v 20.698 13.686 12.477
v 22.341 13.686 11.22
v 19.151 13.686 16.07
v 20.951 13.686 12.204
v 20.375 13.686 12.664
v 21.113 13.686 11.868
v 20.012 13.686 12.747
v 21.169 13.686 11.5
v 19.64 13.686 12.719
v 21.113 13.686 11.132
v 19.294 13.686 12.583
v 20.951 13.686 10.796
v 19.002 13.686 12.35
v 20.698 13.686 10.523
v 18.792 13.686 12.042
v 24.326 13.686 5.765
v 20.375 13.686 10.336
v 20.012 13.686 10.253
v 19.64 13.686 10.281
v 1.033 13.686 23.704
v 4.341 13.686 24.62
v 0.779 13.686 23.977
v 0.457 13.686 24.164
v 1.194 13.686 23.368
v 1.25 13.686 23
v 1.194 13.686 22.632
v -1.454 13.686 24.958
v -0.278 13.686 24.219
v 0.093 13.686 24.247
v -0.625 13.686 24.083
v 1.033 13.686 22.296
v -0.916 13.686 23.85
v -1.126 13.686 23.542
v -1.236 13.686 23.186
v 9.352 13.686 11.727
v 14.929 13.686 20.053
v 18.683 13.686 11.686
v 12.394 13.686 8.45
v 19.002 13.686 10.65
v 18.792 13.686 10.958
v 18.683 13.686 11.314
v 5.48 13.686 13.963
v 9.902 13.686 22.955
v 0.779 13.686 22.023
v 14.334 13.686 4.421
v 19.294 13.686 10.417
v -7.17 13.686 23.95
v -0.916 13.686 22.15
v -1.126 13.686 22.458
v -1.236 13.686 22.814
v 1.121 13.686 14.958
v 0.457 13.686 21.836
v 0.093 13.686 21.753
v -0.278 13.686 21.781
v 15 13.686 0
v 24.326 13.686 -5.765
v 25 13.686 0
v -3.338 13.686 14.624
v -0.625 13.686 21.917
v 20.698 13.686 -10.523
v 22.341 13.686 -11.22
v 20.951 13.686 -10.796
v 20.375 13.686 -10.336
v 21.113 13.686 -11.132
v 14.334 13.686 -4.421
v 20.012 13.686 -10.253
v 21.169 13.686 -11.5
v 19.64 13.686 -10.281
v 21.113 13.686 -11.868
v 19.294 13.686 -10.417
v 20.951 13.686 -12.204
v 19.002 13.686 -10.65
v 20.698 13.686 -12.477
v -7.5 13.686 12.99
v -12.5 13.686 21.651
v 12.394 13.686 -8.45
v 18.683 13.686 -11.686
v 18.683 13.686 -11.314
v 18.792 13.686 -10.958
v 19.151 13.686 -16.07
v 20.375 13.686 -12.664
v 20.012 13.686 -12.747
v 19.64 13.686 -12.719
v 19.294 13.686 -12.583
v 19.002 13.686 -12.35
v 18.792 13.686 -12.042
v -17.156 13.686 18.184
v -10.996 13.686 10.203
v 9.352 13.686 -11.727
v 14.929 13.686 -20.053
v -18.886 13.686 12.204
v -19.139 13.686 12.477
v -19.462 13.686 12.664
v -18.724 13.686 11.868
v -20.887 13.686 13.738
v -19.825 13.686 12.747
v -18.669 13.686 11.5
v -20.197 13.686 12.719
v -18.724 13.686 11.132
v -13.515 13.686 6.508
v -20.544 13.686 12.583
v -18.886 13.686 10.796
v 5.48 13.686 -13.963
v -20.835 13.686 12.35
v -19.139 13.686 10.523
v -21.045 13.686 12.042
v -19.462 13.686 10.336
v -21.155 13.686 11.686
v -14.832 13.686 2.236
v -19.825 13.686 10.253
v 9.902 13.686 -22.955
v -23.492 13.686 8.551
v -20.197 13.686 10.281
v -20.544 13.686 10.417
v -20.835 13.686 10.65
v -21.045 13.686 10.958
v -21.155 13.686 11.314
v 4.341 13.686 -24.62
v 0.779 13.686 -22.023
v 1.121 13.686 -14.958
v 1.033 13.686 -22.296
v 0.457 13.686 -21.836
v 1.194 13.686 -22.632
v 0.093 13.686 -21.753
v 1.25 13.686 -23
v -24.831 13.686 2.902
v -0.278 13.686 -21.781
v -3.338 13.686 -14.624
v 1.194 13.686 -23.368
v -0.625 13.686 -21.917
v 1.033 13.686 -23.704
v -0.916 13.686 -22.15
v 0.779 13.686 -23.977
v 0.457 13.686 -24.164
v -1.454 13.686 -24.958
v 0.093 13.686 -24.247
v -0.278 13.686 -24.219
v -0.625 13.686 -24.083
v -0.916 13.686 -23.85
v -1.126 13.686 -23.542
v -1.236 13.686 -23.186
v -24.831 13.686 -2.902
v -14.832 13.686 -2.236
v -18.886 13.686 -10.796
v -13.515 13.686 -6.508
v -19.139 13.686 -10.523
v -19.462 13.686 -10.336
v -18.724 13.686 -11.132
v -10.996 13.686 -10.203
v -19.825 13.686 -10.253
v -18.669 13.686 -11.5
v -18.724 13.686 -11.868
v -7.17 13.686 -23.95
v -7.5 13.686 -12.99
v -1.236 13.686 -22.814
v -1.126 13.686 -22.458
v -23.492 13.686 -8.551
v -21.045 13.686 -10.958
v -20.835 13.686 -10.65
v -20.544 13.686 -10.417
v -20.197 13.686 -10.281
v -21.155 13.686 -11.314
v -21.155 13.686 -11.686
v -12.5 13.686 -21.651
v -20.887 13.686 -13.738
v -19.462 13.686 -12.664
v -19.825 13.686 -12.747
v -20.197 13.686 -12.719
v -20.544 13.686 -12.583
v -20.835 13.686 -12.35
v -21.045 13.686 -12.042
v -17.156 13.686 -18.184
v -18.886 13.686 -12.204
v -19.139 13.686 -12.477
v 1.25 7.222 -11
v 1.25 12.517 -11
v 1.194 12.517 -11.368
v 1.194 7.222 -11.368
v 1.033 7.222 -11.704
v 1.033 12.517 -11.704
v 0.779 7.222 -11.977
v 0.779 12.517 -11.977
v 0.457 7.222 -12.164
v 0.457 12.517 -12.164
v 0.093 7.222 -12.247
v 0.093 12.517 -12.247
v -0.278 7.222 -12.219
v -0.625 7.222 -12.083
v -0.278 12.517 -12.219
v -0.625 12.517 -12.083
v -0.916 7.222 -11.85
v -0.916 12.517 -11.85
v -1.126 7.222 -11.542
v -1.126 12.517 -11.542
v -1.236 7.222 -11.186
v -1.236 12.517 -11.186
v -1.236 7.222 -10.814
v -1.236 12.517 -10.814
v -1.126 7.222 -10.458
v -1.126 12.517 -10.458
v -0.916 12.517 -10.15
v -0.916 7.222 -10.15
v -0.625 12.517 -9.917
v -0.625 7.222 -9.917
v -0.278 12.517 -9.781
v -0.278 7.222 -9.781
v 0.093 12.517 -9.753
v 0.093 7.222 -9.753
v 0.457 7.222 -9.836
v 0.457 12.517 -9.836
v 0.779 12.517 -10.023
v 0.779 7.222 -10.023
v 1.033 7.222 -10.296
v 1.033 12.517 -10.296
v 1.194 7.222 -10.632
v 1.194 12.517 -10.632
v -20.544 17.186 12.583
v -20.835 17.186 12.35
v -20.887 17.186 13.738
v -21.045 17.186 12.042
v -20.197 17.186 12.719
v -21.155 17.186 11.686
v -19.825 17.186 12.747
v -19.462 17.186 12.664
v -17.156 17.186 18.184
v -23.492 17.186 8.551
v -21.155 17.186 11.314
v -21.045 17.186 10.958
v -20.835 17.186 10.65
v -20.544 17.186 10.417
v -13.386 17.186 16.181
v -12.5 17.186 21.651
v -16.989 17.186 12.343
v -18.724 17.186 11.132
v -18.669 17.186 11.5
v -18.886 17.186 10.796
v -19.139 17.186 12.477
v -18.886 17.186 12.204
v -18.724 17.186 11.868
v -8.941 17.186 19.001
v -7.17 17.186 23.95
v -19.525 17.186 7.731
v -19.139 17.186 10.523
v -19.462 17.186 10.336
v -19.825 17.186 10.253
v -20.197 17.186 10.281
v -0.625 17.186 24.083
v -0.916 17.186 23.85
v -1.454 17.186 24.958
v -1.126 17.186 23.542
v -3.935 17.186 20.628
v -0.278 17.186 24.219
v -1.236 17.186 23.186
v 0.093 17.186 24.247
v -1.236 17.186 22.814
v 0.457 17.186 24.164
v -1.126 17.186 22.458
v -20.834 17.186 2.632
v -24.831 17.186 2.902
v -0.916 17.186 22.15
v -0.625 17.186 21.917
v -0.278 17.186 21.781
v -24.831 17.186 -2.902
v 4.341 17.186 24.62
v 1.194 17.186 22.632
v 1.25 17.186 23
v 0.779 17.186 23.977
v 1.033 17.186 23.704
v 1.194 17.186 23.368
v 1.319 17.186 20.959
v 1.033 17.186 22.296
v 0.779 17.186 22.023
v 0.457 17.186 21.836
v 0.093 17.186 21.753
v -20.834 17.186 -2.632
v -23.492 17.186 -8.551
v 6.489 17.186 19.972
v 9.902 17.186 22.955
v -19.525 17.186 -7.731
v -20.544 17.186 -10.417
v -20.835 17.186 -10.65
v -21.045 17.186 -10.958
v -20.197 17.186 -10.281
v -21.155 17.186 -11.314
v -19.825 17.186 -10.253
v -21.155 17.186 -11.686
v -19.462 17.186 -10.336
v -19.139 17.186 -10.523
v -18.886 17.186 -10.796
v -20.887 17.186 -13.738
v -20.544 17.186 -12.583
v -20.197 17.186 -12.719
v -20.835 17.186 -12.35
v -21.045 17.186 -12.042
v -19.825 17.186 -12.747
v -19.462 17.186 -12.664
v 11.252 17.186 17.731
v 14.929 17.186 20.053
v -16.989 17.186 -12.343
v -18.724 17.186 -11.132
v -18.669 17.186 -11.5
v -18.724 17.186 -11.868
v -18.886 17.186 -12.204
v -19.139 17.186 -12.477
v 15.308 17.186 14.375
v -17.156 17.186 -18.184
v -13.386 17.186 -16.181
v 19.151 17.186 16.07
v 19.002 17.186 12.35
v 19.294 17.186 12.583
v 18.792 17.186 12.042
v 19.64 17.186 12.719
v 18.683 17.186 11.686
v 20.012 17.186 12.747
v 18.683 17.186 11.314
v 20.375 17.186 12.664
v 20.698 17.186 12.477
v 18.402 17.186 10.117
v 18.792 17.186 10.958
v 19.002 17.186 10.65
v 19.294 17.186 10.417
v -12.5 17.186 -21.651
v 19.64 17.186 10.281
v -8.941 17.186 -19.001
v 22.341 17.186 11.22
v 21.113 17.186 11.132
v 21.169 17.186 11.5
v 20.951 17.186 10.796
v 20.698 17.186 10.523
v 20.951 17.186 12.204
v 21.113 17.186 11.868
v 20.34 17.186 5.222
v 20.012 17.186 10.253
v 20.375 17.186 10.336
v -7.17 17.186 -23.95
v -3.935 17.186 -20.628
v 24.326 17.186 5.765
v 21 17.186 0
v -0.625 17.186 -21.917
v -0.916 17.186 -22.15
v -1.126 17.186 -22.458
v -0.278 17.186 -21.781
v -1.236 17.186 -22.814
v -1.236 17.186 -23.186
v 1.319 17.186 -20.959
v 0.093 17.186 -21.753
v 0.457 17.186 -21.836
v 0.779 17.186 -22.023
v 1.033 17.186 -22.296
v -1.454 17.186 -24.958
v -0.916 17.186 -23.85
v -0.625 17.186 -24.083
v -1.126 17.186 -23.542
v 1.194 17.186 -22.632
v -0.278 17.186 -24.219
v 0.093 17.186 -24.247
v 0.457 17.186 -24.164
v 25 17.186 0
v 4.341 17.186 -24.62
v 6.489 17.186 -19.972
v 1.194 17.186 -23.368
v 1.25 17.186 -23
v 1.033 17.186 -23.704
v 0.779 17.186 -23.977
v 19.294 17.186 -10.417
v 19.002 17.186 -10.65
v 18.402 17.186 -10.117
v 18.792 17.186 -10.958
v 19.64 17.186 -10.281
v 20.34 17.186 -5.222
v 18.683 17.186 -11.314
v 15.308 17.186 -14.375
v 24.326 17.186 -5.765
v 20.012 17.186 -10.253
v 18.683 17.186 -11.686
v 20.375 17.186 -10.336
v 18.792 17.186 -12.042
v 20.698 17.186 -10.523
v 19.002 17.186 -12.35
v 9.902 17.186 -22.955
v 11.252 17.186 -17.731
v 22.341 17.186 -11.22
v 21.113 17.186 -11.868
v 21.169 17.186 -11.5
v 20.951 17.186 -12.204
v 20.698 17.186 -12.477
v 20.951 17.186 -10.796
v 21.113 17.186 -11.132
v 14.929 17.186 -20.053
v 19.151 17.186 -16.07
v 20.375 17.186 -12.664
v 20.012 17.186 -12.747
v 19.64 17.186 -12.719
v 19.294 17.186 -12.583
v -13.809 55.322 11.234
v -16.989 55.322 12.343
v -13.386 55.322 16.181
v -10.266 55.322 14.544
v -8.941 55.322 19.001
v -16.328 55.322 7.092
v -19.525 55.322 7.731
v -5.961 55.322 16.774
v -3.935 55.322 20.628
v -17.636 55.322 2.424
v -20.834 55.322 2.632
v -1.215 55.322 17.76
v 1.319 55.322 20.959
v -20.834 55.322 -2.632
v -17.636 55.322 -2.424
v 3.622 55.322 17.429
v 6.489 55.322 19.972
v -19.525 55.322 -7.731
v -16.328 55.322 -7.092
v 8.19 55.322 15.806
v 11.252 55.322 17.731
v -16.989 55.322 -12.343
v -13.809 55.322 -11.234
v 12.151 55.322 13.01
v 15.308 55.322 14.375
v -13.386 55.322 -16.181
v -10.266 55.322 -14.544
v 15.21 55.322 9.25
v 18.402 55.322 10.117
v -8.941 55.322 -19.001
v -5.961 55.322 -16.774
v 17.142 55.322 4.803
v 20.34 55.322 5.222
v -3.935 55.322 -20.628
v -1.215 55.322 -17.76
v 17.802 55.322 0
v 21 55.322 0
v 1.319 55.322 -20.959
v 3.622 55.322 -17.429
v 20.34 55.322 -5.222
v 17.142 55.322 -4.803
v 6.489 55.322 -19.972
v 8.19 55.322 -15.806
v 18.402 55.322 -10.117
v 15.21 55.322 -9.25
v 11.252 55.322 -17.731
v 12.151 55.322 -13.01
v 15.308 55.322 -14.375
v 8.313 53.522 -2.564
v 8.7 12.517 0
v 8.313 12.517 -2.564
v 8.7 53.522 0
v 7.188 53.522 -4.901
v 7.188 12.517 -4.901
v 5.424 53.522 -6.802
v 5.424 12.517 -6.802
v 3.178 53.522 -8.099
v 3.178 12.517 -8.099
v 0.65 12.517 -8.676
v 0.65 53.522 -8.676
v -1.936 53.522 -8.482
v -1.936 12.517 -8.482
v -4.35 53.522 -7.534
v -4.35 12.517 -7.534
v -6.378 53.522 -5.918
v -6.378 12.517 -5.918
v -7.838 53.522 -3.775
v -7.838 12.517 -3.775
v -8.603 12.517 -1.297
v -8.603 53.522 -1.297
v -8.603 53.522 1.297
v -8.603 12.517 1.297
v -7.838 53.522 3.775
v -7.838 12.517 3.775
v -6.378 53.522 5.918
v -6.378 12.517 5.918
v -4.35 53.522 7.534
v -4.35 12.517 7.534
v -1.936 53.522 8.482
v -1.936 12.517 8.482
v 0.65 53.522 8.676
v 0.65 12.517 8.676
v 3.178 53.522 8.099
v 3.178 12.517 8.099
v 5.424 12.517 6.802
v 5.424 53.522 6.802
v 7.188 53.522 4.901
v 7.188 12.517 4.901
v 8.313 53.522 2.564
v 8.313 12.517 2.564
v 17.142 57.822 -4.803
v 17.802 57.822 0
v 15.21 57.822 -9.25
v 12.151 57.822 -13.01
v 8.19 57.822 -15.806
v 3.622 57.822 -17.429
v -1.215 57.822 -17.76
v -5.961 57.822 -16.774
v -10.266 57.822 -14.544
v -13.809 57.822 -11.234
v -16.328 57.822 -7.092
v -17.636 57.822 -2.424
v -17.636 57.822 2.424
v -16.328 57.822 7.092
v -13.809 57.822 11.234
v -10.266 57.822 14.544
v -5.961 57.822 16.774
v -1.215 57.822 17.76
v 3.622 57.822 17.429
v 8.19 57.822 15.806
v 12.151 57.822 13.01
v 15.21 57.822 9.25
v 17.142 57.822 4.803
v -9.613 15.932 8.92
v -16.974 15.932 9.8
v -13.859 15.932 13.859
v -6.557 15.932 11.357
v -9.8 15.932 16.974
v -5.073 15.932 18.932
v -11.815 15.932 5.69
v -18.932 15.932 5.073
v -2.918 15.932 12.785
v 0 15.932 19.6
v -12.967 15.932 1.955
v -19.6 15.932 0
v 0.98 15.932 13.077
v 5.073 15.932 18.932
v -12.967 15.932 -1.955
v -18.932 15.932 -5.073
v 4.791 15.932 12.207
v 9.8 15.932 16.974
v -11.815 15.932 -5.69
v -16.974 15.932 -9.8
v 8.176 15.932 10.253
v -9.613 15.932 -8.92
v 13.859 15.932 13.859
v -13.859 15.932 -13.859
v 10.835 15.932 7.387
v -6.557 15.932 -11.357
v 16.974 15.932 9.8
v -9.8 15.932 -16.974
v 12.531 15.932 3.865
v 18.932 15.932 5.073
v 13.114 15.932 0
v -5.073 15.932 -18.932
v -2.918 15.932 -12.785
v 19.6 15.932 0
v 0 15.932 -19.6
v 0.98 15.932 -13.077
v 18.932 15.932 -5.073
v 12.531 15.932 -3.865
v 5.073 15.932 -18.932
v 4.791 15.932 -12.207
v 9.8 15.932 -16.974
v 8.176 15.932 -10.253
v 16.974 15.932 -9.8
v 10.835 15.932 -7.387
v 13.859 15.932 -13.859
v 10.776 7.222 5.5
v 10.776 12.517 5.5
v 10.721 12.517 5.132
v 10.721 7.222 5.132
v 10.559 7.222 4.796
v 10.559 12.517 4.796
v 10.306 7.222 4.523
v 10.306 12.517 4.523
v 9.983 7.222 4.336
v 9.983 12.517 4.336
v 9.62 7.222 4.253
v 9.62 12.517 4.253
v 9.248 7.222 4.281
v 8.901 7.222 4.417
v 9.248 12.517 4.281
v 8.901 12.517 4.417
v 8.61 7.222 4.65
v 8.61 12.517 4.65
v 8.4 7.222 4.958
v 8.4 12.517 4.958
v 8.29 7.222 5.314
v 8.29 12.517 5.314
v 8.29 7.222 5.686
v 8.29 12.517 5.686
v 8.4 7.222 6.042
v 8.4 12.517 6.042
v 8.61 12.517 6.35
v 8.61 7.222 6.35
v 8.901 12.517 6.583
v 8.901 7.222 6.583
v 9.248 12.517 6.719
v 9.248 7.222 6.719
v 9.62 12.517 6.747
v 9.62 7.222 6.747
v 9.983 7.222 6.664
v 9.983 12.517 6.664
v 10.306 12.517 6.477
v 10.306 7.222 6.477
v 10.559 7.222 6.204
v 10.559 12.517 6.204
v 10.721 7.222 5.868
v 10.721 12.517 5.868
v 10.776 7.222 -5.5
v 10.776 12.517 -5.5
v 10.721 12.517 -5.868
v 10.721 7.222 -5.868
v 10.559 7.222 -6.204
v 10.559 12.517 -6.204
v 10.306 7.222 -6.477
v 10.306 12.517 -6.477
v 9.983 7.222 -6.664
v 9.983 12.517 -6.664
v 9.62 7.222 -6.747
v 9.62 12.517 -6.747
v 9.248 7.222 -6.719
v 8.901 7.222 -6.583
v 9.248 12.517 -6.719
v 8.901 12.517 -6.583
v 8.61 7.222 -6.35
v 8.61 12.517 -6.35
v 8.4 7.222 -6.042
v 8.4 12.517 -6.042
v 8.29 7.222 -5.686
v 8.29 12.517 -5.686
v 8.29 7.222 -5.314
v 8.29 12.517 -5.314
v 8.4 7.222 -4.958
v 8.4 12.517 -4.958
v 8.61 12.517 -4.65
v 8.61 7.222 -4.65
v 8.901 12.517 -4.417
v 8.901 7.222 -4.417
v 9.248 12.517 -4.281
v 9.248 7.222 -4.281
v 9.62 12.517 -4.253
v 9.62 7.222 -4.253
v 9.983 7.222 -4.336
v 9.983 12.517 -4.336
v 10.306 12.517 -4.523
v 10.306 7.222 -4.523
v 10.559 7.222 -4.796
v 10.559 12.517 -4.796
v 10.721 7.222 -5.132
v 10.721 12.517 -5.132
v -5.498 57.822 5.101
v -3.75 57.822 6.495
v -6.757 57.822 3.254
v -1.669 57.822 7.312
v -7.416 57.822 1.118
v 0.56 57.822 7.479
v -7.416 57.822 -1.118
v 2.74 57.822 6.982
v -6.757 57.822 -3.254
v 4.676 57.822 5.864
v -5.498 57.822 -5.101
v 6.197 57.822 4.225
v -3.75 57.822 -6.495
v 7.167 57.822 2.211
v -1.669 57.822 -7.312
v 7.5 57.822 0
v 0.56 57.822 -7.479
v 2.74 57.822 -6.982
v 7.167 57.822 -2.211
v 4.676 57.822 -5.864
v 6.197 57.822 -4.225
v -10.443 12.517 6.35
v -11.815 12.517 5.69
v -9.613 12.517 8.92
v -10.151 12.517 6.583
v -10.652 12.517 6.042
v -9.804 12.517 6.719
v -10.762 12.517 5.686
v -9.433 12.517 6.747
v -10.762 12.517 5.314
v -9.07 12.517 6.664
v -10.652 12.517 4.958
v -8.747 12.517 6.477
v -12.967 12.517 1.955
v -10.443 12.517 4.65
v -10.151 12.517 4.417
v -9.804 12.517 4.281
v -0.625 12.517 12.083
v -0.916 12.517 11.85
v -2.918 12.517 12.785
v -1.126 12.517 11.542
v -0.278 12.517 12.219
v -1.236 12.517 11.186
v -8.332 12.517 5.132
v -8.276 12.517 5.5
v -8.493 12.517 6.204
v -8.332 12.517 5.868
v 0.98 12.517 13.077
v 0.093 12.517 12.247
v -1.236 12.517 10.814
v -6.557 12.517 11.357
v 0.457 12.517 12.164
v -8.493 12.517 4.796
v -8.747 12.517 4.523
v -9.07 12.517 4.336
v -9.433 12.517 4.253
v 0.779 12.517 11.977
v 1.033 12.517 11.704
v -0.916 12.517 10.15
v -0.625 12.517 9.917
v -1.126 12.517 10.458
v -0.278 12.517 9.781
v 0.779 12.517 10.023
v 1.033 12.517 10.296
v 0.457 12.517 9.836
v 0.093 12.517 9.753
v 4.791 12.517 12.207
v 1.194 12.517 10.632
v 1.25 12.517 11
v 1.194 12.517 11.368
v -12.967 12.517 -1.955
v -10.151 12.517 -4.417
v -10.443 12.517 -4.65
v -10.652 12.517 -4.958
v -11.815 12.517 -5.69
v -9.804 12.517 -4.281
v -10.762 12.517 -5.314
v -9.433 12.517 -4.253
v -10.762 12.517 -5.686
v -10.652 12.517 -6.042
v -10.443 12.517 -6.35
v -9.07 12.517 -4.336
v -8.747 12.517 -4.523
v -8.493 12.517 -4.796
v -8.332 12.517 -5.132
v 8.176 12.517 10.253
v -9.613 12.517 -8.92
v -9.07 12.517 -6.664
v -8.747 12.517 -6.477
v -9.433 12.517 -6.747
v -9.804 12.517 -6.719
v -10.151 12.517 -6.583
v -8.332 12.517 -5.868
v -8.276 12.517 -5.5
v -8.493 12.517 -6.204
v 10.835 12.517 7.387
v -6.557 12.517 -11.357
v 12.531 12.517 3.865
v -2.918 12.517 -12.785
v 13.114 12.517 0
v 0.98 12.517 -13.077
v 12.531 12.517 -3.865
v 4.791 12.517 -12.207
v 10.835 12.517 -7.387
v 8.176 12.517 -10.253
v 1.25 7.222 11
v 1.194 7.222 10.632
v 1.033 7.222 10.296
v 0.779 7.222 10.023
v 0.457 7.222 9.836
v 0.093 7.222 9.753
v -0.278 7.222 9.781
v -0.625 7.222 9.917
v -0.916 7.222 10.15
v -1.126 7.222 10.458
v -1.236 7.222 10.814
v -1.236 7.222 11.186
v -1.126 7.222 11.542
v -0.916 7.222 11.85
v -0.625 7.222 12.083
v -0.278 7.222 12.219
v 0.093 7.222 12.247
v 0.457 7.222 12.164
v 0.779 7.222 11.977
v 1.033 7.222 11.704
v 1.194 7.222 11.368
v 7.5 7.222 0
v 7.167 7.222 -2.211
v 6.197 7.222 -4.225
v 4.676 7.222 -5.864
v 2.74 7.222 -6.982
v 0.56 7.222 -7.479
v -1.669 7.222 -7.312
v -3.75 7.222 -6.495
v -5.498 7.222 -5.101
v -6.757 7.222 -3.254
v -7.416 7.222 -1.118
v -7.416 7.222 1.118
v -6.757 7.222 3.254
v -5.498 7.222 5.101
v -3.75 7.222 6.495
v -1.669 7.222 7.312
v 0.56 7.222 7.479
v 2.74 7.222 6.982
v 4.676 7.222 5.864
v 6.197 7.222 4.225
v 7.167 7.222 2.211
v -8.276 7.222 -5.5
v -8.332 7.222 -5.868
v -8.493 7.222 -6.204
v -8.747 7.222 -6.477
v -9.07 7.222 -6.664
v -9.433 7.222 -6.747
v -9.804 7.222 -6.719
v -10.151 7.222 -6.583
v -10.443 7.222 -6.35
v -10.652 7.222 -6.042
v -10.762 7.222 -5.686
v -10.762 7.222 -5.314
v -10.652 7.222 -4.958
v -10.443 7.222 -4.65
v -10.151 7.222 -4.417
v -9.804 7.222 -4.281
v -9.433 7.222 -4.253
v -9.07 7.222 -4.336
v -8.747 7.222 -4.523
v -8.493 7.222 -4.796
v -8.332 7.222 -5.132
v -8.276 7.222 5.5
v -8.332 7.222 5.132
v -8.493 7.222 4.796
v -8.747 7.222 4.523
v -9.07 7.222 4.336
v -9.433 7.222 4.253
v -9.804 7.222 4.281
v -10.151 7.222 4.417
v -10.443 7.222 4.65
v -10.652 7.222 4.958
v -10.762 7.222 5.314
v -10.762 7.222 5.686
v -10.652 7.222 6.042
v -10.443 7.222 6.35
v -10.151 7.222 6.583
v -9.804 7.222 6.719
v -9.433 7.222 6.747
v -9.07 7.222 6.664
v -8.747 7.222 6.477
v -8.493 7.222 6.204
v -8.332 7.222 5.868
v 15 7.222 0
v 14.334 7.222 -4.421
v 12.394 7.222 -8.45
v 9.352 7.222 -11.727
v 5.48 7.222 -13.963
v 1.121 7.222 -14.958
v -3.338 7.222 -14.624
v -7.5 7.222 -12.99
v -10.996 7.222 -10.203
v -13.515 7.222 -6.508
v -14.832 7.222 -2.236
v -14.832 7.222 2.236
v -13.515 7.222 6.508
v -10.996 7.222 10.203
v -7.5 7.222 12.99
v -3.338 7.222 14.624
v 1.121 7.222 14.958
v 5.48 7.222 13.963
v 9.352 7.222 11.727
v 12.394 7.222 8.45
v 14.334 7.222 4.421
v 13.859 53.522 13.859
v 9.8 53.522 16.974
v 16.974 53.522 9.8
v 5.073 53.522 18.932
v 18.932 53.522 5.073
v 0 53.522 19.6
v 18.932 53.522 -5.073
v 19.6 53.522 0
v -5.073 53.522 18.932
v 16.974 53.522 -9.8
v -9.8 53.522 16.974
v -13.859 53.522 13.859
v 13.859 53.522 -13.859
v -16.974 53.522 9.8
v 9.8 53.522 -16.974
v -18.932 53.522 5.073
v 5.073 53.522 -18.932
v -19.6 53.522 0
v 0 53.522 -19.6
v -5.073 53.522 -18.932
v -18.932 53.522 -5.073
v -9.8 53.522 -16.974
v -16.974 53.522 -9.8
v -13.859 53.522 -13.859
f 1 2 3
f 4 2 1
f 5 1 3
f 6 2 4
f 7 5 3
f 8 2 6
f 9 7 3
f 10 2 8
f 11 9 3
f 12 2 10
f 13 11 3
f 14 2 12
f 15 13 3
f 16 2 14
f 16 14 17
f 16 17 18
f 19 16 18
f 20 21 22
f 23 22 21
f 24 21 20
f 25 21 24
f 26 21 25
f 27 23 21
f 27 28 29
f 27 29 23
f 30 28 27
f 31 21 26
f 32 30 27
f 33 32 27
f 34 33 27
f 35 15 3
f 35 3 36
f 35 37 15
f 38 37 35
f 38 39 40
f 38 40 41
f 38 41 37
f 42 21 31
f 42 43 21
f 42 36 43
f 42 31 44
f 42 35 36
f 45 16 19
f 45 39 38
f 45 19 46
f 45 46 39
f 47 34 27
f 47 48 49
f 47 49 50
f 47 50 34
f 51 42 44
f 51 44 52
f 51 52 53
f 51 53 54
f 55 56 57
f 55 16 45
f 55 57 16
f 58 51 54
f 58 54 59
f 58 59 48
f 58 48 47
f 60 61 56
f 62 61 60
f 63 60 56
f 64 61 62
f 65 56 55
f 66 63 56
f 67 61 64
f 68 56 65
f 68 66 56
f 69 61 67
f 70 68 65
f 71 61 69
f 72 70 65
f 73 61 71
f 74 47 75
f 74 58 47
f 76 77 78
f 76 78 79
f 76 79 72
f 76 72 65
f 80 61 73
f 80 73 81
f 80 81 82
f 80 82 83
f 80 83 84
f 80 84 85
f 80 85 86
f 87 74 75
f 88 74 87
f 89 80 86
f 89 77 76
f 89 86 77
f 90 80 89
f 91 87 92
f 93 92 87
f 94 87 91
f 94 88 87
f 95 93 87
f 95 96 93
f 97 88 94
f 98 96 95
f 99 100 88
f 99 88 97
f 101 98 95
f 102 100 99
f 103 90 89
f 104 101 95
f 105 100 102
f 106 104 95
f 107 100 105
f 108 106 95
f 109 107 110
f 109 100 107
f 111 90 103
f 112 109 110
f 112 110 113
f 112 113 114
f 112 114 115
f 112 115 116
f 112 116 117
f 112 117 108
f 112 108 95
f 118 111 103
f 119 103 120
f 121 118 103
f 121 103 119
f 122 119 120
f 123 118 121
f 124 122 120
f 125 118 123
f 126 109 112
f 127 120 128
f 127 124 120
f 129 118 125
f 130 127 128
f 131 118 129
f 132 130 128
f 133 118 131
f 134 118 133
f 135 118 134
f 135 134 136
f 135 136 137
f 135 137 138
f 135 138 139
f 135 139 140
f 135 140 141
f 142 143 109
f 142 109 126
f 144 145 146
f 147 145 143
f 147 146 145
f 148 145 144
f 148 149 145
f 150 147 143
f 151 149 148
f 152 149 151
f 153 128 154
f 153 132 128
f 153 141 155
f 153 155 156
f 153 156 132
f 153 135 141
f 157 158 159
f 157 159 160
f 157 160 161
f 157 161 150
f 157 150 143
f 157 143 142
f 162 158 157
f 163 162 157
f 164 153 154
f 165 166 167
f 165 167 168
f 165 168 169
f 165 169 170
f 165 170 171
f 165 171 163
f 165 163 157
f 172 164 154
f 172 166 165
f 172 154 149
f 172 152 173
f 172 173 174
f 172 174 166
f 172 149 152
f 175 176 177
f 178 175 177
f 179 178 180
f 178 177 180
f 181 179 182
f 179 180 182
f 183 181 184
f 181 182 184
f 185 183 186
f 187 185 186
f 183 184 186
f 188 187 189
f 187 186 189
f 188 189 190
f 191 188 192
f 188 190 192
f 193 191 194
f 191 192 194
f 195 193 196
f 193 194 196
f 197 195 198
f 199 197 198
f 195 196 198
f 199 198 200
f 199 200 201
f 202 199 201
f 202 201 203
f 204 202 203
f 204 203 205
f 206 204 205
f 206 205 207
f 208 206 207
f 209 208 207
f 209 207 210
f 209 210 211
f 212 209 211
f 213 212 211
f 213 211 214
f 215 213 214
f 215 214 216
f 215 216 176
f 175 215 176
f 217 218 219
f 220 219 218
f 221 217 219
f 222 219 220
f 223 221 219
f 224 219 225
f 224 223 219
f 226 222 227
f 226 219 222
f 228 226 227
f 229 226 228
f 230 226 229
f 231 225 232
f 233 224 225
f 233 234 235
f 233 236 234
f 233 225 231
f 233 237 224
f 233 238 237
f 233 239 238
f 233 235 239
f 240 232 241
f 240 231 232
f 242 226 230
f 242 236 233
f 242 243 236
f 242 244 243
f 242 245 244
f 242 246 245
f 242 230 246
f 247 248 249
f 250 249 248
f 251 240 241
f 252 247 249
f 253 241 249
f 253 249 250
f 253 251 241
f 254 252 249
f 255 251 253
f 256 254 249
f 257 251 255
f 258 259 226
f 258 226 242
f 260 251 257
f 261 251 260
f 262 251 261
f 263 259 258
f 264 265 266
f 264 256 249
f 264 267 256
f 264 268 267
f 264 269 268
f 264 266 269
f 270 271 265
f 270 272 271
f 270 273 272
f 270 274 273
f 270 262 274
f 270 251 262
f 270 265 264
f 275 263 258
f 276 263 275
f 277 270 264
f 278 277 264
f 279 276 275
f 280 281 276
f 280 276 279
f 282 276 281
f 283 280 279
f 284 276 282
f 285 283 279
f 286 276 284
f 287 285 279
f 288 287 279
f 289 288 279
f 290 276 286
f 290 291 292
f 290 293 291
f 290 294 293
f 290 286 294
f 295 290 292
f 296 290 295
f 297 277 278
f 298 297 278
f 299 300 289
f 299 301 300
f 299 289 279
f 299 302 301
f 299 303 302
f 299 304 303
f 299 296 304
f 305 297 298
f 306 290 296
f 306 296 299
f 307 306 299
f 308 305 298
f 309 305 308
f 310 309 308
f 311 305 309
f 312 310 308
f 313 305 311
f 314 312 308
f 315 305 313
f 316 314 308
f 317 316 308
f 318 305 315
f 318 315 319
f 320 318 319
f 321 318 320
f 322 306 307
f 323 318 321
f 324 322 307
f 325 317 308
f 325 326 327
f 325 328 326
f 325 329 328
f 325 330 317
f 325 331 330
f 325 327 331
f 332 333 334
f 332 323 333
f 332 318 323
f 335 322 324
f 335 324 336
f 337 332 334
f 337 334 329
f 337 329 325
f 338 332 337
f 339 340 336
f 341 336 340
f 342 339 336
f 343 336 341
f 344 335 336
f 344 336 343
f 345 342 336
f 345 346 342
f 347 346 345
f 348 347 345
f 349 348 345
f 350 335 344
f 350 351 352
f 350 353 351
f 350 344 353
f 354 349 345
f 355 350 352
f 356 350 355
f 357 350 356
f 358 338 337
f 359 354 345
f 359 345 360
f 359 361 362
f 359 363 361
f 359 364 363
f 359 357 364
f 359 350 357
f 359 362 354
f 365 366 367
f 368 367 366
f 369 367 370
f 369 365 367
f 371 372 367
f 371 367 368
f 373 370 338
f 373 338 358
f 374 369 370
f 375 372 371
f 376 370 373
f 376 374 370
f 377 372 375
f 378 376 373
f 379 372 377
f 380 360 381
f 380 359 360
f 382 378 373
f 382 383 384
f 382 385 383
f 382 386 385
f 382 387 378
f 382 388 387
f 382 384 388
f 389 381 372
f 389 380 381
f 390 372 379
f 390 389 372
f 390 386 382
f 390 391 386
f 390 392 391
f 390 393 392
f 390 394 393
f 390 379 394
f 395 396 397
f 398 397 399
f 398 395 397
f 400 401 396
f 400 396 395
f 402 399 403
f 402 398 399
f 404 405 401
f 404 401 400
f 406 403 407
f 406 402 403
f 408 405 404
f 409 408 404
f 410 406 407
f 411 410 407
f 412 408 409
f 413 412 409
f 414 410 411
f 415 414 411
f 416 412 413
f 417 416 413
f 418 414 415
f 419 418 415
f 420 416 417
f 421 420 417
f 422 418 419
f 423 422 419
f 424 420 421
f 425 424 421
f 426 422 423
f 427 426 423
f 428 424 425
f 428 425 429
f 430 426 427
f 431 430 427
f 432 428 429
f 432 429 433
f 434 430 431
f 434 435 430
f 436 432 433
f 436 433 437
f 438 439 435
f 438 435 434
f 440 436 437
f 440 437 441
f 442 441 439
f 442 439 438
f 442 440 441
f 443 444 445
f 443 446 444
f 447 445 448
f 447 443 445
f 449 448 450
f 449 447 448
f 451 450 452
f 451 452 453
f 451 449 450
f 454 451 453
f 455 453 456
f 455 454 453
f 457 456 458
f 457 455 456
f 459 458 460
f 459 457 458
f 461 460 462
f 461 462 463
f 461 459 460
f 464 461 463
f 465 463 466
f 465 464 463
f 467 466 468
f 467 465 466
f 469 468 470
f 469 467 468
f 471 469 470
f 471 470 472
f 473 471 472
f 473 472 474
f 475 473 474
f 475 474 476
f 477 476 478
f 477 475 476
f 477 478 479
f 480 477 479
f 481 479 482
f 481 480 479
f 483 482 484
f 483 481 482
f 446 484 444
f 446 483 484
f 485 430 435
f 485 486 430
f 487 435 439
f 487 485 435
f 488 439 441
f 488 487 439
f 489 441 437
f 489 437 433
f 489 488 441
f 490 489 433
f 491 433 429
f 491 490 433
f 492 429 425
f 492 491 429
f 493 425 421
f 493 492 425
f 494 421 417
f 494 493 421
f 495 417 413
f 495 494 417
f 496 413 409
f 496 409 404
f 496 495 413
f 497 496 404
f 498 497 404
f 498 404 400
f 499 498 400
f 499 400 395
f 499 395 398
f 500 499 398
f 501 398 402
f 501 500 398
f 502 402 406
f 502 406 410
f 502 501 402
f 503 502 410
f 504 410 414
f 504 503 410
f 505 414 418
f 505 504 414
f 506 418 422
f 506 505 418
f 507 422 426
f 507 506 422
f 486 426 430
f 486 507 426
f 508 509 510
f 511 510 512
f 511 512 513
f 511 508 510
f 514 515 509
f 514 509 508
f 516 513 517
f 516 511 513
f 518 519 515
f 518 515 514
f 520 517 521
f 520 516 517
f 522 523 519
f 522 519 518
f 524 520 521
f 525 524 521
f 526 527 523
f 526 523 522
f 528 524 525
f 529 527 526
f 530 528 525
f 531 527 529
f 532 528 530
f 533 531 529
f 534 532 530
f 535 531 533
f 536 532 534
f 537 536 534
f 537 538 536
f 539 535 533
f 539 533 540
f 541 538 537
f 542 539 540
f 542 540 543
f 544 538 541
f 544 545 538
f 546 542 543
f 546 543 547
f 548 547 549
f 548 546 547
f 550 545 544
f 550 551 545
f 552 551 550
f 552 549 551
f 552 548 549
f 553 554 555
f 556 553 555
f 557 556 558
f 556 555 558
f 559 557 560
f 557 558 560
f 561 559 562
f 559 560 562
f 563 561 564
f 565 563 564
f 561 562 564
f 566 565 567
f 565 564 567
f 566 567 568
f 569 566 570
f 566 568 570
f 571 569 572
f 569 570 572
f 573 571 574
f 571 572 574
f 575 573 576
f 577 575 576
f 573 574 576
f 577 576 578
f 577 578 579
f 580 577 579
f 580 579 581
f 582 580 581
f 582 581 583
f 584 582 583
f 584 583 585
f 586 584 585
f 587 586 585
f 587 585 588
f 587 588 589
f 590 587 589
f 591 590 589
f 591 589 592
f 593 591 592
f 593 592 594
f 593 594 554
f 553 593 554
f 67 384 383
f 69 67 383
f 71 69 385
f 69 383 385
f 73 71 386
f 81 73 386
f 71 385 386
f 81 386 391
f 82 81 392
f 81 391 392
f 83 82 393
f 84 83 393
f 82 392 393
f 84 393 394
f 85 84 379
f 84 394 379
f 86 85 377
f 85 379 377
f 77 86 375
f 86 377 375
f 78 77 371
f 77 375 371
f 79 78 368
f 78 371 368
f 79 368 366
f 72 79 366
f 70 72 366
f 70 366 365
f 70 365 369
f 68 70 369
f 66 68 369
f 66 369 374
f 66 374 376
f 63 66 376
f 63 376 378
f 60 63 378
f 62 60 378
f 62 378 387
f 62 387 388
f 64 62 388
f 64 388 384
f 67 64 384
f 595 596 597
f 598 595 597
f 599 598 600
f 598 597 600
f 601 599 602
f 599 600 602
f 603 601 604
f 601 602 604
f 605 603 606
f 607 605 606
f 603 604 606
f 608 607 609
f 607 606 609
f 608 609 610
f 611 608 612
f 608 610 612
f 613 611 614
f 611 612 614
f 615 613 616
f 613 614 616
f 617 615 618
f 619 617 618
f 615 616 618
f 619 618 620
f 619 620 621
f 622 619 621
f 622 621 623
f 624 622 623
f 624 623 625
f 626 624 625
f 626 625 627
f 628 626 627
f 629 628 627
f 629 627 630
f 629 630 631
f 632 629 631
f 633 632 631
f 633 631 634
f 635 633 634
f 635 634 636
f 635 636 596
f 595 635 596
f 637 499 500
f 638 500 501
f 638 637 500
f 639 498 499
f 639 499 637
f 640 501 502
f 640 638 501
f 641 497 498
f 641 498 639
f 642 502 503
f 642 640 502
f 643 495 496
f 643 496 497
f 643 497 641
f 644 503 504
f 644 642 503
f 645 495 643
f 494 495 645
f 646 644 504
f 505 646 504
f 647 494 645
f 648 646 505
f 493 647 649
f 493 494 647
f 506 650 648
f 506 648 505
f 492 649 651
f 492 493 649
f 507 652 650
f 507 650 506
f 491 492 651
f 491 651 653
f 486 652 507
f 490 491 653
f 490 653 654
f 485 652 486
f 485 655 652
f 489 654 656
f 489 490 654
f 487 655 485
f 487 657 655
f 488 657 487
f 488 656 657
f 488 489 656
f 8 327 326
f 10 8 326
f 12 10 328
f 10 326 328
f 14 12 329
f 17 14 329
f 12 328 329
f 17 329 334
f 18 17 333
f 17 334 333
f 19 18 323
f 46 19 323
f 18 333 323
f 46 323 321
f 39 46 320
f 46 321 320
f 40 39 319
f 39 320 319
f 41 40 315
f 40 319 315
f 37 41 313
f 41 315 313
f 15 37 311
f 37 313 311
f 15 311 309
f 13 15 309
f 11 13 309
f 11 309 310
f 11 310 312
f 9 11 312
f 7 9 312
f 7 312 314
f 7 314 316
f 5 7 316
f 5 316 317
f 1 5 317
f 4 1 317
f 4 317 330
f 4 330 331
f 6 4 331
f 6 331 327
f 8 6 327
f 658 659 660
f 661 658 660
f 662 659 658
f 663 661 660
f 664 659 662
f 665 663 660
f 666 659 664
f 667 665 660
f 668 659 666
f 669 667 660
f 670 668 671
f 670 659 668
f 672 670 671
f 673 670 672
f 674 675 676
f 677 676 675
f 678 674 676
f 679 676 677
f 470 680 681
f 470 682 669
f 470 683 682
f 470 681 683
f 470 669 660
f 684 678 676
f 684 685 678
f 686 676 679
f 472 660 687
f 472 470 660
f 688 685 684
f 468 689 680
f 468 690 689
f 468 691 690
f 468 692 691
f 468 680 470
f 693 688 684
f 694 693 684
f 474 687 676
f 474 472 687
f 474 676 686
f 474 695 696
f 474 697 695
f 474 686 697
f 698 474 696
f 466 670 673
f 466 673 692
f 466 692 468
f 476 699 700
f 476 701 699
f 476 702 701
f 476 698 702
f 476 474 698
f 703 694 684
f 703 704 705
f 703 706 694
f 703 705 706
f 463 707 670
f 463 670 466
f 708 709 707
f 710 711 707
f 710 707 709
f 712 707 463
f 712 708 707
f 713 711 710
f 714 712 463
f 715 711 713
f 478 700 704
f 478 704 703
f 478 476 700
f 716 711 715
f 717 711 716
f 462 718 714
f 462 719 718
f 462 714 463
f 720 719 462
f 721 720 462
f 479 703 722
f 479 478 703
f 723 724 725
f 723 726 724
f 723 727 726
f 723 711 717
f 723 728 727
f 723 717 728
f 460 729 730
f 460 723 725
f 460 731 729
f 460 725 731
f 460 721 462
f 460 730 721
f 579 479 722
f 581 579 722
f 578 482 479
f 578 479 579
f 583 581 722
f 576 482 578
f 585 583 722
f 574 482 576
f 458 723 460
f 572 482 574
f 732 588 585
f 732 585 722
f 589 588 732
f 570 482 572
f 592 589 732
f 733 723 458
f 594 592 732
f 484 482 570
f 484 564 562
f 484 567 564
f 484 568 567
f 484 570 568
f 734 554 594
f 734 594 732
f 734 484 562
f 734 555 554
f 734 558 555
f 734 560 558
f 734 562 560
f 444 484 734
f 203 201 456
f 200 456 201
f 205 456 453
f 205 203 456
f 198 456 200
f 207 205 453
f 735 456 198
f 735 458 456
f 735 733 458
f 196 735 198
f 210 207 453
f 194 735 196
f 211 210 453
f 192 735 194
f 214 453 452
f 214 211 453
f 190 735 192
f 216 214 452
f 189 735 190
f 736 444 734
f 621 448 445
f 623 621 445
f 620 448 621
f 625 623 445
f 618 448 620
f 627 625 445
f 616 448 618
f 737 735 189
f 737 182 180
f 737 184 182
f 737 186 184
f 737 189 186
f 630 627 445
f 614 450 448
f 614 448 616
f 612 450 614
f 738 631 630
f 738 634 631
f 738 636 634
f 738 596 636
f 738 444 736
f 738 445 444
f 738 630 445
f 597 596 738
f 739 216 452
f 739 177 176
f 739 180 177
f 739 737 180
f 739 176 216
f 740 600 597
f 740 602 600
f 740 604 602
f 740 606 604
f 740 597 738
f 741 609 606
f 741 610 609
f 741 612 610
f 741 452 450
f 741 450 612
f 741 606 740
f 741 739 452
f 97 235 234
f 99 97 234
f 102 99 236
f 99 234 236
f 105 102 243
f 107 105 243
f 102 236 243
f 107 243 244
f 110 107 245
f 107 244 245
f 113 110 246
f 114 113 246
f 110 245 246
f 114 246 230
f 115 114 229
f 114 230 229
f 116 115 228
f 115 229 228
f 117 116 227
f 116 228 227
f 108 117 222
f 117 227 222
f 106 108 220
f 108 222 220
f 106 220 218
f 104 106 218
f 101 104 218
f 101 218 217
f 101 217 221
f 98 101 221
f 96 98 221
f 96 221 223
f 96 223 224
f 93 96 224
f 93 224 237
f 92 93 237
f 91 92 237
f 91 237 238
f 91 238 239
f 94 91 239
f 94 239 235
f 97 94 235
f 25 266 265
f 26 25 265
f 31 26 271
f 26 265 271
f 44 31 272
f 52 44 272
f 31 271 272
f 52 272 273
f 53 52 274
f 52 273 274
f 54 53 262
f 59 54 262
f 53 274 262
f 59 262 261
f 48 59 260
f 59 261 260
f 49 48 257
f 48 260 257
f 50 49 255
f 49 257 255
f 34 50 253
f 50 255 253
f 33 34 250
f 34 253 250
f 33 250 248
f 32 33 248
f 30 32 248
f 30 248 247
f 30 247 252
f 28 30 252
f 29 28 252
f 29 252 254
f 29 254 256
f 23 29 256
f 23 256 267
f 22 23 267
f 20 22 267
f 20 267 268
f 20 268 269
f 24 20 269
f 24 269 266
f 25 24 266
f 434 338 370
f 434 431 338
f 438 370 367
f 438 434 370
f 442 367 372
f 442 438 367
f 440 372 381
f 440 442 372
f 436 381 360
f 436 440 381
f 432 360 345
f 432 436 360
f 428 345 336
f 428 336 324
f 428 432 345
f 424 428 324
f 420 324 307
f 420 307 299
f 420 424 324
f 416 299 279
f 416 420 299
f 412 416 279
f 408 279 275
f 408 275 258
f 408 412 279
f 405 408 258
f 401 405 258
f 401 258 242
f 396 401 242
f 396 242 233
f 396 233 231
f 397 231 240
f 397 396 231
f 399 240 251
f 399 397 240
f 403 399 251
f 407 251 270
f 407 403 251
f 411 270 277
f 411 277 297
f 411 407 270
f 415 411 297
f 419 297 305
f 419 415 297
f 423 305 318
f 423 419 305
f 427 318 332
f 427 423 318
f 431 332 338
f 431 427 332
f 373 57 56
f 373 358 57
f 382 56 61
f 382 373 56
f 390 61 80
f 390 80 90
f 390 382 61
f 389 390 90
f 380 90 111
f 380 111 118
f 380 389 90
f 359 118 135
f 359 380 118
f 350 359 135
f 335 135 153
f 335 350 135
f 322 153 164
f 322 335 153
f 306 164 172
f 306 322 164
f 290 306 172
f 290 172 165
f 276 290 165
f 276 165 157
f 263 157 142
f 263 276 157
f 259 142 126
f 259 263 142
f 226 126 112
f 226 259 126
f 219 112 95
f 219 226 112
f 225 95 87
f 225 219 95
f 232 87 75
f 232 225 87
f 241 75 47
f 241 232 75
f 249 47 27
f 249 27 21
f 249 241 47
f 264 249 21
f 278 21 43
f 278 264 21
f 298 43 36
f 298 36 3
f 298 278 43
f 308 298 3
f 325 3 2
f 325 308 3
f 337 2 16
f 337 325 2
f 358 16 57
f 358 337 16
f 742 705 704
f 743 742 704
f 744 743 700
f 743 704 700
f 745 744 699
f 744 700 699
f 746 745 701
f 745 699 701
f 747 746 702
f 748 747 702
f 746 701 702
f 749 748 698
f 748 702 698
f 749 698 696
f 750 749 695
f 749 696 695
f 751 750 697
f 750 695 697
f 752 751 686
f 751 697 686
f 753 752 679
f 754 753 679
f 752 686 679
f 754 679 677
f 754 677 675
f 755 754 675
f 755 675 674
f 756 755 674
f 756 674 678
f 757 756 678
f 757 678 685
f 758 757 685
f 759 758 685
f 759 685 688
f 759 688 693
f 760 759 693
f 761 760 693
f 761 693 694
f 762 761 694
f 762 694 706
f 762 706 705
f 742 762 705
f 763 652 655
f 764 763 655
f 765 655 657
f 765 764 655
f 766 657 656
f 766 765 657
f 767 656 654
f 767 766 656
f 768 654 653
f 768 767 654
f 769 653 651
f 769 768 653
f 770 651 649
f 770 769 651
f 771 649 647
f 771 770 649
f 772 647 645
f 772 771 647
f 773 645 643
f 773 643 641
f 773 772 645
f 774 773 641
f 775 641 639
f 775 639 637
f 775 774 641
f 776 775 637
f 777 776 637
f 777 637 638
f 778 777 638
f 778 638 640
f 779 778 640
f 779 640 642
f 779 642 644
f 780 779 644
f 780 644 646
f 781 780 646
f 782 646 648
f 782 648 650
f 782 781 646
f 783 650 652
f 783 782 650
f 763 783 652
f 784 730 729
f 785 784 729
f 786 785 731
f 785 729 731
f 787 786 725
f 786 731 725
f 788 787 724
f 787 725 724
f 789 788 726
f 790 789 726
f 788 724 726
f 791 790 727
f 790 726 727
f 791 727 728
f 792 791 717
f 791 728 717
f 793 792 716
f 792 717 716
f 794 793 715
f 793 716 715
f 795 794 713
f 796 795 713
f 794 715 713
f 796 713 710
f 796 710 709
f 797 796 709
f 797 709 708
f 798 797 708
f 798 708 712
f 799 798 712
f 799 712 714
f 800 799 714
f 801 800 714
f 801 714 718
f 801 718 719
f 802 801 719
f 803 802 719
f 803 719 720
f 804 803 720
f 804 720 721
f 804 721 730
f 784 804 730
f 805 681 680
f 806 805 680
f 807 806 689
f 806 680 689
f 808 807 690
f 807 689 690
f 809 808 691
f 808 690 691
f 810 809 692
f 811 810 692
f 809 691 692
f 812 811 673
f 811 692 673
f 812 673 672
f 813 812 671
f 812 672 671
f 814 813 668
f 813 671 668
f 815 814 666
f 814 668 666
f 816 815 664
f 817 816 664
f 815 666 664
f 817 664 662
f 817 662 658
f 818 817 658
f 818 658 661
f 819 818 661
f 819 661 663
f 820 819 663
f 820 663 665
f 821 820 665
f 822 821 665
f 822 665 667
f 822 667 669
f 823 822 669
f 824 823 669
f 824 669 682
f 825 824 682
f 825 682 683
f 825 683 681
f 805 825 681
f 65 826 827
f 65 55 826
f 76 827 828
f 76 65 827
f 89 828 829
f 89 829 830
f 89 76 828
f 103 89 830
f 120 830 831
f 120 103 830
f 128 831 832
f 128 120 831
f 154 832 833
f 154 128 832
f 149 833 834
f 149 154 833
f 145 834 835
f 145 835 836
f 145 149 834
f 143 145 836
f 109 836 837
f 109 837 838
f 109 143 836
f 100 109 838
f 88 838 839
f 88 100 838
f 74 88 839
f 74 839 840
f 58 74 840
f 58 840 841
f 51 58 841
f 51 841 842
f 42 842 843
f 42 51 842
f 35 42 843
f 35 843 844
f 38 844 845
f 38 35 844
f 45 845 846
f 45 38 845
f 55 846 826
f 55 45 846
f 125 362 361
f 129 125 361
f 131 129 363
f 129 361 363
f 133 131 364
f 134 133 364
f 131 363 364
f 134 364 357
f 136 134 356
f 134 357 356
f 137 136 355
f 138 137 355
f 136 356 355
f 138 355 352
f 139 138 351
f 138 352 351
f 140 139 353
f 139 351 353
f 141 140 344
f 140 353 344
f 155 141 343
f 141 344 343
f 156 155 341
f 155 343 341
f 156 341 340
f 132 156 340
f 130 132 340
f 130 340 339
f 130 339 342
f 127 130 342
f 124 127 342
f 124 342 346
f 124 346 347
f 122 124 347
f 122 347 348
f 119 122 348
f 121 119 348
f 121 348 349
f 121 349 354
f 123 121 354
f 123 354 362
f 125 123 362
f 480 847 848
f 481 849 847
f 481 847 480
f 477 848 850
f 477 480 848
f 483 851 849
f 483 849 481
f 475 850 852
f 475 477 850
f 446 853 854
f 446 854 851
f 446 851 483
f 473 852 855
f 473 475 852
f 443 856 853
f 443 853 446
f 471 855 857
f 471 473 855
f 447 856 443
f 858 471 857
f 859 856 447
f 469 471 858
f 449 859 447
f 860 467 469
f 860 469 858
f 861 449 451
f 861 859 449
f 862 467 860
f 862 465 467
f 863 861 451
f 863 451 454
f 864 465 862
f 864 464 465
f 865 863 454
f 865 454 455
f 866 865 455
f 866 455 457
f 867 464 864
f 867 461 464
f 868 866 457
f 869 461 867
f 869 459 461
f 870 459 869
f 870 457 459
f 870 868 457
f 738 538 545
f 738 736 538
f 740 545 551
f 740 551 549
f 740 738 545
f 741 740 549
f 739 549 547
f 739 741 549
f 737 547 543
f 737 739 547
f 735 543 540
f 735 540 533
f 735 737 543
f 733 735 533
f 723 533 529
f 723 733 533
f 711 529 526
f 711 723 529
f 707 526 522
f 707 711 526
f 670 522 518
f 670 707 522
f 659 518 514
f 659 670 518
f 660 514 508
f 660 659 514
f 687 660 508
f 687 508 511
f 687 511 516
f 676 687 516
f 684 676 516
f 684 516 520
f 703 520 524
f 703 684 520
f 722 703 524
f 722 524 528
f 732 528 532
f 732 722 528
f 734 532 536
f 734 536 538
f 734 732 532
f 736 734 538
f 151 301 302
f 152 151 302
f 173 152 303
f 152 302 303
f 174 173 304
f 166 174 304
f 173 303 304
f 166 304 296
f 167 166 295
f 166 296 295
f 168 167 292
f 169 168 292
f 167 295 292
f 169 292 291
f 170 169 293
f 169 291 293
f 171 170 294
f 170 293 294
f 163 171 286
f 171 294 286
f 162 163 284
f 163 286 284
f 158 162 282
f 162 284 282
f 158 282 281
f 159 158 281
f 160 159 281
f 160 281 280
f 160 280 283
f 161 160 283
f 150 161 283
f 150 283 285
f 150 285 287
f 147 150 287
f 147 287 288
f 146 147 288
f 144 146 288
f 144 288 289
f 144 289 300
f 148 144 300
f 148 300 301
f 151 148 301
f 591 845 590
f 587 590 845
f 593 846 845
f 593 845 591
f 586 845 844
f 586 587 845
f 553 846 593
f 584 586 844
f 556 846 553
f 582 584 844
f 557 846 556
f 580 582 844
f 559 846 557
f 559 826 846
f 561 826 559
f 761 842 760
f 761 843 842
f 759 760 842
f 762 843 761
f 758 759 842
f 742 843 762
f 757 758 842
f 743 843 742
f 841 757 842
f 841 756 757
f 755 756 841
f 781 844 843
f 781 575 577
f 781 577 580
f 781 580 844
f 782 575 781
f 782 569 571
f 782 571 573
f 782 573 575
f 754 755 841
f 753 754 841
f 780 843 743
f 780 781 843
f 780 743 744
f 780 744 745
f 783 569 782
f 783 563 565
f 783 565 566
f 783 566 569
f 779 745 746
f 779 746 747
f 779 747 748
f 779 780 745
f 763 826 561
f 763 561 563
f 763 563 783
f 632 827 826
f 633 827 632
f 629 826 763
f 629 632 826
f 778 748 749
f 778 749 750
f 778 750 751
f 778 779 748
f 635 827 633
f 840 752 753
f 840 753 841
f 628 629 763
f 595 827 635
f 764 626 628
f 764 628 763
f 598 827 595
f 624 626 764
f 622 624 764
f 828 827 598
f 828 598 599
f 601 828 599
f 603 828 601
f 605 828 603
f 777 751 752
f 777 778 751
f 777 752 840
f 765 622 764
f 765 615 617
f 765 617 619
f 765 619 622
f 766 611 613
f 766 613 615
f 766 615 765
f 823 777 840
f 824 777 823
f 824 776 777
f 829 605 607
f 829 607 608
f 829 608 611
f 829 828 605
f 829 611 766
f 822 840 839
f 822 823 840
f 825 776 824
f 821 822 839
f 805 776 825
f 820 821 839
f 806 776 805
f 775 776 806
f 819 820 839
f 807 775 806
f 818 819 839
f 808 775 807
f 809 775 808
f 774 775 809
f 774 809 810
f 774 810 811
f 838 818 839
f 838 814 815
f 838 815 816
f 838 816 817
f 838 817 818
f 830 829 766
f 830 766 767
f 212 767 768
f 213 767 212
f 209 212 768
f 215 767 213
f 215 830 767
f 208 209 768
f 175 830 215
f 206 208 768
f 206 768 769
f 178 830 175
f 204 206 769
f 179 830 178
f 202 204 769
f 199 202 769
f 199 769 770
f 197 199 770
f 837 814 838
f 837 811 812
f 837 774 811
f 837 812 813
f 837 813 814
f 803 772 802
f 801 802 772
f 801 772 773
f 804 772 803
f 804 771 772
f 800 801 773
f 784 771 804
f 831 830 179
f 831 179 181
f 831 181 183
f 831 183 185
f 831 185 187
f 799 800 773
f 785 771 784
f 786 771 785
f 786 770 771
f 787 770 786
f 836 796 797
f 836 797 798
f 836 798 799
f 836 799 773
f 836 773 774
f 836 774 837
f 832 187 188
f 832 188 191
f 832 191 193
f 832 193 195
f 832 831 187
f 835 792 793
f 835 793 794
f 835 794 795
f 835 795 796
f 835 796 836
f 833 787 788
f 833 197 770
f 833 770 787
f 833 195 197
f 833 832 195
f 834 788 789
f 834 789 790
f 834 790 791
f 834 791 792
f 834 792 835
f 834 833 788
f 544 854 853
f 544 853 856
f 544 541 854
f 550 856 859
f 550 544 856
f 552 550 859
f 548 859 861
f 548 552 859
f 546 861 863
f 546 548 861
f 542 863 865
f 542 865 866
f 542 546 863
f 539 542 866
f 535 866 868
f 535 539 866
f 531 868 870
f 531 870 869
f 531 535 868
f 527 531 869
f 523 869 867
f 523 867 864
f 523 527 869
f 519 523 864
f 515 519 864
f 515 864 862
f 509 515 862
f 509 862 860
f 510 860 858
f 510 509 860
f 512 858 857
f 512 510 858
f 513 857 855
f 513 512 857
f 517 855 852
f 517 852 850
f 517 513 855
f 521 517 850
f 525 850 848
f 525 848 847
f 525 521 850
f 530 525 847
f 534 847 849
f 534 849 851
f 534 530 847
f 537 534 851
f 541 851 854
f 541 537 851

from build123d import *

# Parameters (mm, degrees)
SKETCH2_R          = 1.25
CUT_EXTRUDE1_DEPTH = 10
SKETCH4_R          = 1.25
CUT_EXTRUDE2_DEPTH = 10


with BuildPart() as part:
    # Sketch1 → Revolve1 (revolve)
    with BuildSketch(Plane.XY):
        Polygon((7.5, 57.821876273), (7.5, 7.221876273), (15, 7.221876273), (15, 13.686423943), (25, 13.686423943), (25, 17.186423943), (21, 17.186423943), (21, 55.321876273), (17.801767056, 55.321876273), (17.801767056, 57.821876273), align=None)
        Polygon((8.7, 53.521876273), (19.6, 53.521876273), (19.6, 15.931935651), (13.113770226, 15.931935651), (13.113770226, 12.516887812), (8.7, 12.516887812), align=None, mode=Mode.SUBTRACT)
    revolve(axis=Axis((0, 0, 0), (0, 1, 0)))

    # Sketch2 → Cut-Extrude1 (cut)
    with BuildSketch(Plane(origin=(0, 17.186423943, 0), x_dir=(1, 0, 0), z_dir=(0, 1, 0))):
        with Locations((0, 23)):
            Circle(SKETCH2_R)
        with Locations((19.918584287, 11.5)):
            Circle(SKETCH2_R)
        with Locations((19.918584287, -11.5)):
            Circle(SKETCH2_R)
        with Locations((0, -23)):
            Circle(SKETCH2_R)
        with Locations((-19.918584287, -11.5)):
            Circle(SKETCH2_R)
        with Locations((-19.918584287, 11.5)):
            Circle(SKETCH2_R)
    extrude(amount=-CUT_EXTRUDE1_DEPTH, mode=Mode.SUBTRACT)

    # Sketch4 → Cut-Extrude2 (cut)
    with BuildSketch(Plane(origin=(0, 12.516887812, 0), x_dir=(1, 0, 0), z_dir=(0, 1, 0))):
        with Locations((0, 11)):
            Circle(SKETCH4_R)
        with Locations((9.526279442, 5.5)):
            Circle(SKETCH4_R)
        with Locations((9.526279442, -5.5)):
            Circle(SKETCH4_R)
        with Locations((0, -11)):
            Circle(SKETCH4_R)
        with Locations((-9.526279442, -5.5)):
            Circle(SKETCH4_R)
        with Locations((-9.526279442, 5.5)):
            Circle(SKETCH4_R)
    extrude(amount=-CUT_EXTRUDE2_DEPTH, mode=Mode.SUBTRACT)


solid = part.part
